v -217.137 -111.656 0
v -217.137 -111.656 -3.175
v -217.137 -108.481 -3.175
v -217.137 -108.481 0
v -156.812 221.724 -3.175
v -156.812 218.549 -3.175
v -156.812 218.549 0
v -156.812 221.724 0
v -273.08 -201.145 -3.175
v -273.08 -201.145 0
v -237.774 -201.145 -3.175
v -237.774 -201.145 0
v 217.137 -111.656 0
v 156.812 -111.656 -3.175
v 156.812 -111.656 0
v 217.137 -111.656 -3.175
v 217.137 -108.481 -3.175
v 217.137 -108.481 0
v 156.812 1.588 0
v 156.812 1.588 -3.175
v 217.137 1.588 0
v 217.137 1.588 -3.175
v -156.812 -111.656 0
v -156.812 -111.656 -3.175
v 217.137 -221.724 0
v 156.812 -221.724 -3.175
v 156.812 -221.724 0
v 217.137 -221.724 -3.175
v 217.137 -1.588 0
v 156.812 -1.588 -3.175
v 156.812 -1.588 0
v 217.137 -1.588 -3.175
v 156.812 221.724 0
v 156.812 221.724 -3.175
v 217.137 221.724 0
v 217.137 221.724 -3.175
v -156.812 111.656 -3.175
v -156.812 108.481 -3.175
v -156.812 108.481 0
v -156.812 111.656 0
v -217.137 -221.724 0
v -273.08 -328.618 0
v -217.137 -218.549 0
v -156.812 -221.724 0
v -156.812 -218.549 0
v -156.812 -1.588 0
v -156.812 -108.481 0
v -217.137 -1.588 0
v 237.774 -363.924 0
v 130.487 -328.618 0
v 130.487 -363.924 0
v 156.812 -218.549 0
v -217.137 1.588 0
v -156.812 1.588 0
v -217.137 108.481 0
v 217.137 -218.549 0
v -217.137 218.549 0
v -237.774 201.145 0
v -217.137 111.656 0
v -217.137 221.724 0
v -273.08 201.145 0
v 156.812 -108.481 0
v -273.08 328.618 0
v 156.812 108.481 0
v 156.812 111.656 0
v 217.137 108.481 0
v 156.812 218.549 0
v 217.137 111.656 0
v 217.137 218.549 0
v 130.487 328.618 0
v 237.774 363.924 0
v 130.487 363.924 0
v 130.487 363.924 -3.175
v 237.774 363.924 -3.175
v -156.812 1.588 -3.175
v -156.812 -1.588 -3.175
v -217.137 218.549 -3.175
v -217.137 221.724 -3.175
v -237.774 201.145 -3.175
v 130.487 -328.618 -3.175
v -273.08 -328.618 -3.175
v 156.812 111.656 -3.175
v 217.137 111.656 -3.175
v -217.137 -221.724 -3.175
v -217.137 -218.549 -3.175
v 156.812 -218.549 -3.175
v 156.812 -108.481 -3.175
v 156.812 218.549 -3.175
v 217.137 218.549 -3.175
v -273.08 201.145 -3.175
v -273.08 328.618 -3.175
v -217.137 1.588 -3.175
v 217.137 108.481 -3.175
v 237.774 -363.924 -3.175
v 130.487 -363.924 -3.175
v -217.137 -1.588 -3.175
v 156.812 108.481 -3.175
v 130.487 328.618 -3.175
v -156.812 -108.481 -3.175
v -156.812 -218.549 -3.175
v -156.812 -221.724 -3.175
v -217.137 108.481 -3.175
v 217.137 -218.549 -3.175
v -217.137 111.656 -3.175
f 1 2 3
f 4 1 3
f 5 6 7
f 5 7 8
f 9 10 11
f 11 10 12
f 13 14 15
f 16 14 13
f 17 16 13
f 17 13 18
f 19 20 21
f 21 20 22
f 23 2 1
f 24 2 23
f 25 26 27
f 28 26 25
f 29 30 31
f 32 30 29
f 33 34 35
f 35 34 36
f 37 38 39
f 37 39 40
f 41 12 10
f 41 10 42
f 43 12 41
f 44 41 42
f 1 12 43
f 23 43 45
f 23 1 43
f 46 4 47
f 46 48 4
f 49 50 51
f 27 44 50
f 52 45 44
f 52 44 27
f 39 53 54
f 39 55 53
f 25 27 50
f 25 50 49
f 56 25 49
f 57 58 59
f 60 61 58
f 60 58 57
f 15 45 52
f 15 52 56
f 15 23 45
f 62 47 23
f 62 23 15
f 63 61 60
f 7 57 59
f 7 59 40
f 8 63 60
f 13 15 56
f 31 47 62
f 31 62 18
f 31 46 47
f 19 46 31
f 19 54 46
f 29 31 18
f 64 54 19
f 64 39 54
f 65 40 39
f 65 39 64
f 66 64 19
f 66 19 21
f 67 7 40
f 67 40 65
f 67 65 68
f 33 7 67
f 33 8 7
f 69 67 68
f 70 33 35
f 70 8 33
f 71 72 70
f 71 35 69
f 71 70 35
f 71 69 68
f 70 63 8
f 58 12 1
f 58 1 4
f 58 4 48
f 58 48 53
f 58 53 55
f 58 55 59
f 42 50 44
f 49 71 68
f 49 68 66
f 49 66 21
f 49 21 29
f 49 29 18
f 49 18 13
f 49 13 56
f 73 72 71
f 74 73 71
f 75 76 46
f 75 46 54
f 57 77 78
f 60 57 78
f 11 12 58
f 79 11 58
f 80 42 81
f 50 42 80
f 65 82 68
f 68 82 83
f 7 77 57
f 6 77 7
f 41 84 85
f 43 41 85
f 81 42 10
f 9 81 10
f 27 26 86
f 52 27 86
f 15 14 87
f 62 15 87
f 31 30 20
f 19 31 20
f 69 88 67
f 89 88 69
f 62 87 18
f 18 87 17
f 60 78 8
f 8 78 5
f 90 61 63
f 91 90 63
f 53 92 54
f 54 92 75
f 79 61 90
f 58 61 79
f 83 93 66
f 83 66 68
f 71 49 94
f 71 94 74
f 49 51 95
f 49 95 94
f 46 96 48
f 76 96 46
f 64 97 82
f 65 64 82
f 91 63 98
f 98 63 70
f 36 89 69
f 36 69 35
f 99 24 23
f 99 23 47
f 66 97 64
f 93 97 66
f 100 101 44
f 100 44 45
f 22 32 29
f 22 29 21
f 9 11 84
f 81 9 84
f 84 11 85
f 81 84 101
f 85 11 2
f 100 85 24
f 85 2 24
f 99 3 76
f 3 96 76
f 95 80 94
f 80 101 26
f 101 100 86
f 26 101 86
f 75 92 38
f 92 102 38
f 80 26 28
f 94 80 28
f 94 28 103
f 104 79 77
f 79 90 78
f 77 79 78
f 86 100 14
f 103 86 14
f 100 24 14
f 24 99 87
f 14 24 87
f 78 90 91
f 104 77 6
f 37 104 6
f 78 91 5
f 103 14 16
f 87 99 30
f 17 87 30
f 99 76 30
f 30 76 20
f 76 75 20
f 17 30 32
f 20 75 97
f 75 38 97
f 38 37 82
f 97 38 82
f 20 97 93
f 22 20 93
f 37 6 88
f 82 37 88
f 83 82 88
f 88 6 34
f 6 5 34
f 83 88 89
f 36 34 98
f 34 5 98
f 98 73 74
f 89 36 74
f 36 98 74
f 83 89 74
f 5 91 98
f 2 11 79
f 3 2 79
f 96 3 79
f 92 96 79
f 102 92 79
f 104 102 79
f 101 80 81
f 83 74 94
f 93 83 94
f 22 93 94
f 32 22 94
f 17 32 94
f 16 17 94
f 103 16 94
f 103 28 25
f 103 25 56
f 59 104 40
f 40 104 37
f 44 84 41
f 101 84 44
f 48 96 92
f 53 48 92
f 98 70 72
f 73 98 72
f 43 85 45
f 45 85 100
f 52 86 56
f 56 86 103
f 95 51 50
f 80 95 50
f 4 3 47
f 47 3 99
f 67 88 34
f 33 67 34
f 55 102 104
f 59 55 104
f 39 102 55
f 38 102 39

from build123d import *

# Parameters (mm, degrees)
SKETCH1_W               = 475.54896
SKETCH1_H               = 657.23516
BASE_FLANGE1_DEPTH      = 3.175
CUT_EXTRUDE1_DEPTH      = 406.63074076
CUT_EXTRUDE1_DEPTH_BACK = 406.63074076
SKETCH2_W               = 60.325
SKETCH2_H               = 3.175
SKETCH3_W               = 107.287119944
SKETCH3_H               = 35.306
SKETCH3_W_2             = 35.306
SKETCH3_H_2             = 127.472499944
BOSS_EXTRUDE1_DEPTH     = 3.175


# Sheet-metal steps are written as plain solids
with BuildPart() as part:
    # Sketch1 → Base-Flange1 (new body)
    with BuildSketch(Plane.XY):
        Rectangle(SKETCH1_W, SKETCH1_H)
    extrude(amount=-BASE_FLANGE1_DEPTH)

    # Sketch2 → Cut-Extrude1 (cut, two sides: drawn at the far end of the back side and taken through both)
    with BuildSketch(Plane.XY.offset(-CUT_EXTRUDE1_DEPTH_BACK)):
        with Locations((-186.97448, 220.13672)):
            Rectangle(SKETCH2_W, SKETCH2_H)
        with Locations((186.97448, -220.13672)):
            Rectangle(SKETCH2_W, SKETCH2_H)
        with Locations((186.97448, 220.13672)):
            Rectangle(SKETCH2_W, SKETCH2_H)
        with Locations((-186.97448, -220.13672)):
            Rectangle(SKETCH2_W, SKETCH2_H)
        with Locations((-186.97448, 0)):
            Rectangle(SKETCH2_W, SKETCH2_H)
        with Locations((186.97448, -110.06836)):
            Rectangle(SKETCH2_W, SKETCH2_H)
        with Locations((-186.97448, -110.06836)):
            Rectangle(SKETCH2_W, SKETCH2_H)
        with Locations((-186.97448, 110.06836)):
            Rectangle(SKETCH2_W, SKETCH2_H)
        with Locations((186.97448, 0)):
            Rectangle(SKETCH2_W, SKETCH2_H)
        with Locations((186.97448, 110.06836)):
            Rectangle(SKETCH2_W, SKETCH2_H)
    extrude(amount=CUT_EXTRUDE1_DEPTH + CUT_EXTRUDE1_DEPTH_BACK, mode=Mode.SUBTRACT)

    # Sketch3 → Boss-Extrude1 (add)
    with BuildSketch(Plane.XY):
        with Locations((184.130920028, 346.27058)):
            Rectangle(SKETCH3_W, SKETCH3_H)
        with Locations((-255.42748, 264.881330028)):
            Rectangle(SKETCH3_W_2, SKETCH3_H_2)
        with Locations((-255.42748, -264.881330028)):
            Rectangle(SKETCH3_W_2, SKETCH3_H_2)
        with Locations((184.130920028, -346.27058)):
            Rectangle(SKETCH3_W, SKETCH3_H)
    extrude(amount=-BOSS_EXTRUDE1_DEPTH)


solid = part.part
